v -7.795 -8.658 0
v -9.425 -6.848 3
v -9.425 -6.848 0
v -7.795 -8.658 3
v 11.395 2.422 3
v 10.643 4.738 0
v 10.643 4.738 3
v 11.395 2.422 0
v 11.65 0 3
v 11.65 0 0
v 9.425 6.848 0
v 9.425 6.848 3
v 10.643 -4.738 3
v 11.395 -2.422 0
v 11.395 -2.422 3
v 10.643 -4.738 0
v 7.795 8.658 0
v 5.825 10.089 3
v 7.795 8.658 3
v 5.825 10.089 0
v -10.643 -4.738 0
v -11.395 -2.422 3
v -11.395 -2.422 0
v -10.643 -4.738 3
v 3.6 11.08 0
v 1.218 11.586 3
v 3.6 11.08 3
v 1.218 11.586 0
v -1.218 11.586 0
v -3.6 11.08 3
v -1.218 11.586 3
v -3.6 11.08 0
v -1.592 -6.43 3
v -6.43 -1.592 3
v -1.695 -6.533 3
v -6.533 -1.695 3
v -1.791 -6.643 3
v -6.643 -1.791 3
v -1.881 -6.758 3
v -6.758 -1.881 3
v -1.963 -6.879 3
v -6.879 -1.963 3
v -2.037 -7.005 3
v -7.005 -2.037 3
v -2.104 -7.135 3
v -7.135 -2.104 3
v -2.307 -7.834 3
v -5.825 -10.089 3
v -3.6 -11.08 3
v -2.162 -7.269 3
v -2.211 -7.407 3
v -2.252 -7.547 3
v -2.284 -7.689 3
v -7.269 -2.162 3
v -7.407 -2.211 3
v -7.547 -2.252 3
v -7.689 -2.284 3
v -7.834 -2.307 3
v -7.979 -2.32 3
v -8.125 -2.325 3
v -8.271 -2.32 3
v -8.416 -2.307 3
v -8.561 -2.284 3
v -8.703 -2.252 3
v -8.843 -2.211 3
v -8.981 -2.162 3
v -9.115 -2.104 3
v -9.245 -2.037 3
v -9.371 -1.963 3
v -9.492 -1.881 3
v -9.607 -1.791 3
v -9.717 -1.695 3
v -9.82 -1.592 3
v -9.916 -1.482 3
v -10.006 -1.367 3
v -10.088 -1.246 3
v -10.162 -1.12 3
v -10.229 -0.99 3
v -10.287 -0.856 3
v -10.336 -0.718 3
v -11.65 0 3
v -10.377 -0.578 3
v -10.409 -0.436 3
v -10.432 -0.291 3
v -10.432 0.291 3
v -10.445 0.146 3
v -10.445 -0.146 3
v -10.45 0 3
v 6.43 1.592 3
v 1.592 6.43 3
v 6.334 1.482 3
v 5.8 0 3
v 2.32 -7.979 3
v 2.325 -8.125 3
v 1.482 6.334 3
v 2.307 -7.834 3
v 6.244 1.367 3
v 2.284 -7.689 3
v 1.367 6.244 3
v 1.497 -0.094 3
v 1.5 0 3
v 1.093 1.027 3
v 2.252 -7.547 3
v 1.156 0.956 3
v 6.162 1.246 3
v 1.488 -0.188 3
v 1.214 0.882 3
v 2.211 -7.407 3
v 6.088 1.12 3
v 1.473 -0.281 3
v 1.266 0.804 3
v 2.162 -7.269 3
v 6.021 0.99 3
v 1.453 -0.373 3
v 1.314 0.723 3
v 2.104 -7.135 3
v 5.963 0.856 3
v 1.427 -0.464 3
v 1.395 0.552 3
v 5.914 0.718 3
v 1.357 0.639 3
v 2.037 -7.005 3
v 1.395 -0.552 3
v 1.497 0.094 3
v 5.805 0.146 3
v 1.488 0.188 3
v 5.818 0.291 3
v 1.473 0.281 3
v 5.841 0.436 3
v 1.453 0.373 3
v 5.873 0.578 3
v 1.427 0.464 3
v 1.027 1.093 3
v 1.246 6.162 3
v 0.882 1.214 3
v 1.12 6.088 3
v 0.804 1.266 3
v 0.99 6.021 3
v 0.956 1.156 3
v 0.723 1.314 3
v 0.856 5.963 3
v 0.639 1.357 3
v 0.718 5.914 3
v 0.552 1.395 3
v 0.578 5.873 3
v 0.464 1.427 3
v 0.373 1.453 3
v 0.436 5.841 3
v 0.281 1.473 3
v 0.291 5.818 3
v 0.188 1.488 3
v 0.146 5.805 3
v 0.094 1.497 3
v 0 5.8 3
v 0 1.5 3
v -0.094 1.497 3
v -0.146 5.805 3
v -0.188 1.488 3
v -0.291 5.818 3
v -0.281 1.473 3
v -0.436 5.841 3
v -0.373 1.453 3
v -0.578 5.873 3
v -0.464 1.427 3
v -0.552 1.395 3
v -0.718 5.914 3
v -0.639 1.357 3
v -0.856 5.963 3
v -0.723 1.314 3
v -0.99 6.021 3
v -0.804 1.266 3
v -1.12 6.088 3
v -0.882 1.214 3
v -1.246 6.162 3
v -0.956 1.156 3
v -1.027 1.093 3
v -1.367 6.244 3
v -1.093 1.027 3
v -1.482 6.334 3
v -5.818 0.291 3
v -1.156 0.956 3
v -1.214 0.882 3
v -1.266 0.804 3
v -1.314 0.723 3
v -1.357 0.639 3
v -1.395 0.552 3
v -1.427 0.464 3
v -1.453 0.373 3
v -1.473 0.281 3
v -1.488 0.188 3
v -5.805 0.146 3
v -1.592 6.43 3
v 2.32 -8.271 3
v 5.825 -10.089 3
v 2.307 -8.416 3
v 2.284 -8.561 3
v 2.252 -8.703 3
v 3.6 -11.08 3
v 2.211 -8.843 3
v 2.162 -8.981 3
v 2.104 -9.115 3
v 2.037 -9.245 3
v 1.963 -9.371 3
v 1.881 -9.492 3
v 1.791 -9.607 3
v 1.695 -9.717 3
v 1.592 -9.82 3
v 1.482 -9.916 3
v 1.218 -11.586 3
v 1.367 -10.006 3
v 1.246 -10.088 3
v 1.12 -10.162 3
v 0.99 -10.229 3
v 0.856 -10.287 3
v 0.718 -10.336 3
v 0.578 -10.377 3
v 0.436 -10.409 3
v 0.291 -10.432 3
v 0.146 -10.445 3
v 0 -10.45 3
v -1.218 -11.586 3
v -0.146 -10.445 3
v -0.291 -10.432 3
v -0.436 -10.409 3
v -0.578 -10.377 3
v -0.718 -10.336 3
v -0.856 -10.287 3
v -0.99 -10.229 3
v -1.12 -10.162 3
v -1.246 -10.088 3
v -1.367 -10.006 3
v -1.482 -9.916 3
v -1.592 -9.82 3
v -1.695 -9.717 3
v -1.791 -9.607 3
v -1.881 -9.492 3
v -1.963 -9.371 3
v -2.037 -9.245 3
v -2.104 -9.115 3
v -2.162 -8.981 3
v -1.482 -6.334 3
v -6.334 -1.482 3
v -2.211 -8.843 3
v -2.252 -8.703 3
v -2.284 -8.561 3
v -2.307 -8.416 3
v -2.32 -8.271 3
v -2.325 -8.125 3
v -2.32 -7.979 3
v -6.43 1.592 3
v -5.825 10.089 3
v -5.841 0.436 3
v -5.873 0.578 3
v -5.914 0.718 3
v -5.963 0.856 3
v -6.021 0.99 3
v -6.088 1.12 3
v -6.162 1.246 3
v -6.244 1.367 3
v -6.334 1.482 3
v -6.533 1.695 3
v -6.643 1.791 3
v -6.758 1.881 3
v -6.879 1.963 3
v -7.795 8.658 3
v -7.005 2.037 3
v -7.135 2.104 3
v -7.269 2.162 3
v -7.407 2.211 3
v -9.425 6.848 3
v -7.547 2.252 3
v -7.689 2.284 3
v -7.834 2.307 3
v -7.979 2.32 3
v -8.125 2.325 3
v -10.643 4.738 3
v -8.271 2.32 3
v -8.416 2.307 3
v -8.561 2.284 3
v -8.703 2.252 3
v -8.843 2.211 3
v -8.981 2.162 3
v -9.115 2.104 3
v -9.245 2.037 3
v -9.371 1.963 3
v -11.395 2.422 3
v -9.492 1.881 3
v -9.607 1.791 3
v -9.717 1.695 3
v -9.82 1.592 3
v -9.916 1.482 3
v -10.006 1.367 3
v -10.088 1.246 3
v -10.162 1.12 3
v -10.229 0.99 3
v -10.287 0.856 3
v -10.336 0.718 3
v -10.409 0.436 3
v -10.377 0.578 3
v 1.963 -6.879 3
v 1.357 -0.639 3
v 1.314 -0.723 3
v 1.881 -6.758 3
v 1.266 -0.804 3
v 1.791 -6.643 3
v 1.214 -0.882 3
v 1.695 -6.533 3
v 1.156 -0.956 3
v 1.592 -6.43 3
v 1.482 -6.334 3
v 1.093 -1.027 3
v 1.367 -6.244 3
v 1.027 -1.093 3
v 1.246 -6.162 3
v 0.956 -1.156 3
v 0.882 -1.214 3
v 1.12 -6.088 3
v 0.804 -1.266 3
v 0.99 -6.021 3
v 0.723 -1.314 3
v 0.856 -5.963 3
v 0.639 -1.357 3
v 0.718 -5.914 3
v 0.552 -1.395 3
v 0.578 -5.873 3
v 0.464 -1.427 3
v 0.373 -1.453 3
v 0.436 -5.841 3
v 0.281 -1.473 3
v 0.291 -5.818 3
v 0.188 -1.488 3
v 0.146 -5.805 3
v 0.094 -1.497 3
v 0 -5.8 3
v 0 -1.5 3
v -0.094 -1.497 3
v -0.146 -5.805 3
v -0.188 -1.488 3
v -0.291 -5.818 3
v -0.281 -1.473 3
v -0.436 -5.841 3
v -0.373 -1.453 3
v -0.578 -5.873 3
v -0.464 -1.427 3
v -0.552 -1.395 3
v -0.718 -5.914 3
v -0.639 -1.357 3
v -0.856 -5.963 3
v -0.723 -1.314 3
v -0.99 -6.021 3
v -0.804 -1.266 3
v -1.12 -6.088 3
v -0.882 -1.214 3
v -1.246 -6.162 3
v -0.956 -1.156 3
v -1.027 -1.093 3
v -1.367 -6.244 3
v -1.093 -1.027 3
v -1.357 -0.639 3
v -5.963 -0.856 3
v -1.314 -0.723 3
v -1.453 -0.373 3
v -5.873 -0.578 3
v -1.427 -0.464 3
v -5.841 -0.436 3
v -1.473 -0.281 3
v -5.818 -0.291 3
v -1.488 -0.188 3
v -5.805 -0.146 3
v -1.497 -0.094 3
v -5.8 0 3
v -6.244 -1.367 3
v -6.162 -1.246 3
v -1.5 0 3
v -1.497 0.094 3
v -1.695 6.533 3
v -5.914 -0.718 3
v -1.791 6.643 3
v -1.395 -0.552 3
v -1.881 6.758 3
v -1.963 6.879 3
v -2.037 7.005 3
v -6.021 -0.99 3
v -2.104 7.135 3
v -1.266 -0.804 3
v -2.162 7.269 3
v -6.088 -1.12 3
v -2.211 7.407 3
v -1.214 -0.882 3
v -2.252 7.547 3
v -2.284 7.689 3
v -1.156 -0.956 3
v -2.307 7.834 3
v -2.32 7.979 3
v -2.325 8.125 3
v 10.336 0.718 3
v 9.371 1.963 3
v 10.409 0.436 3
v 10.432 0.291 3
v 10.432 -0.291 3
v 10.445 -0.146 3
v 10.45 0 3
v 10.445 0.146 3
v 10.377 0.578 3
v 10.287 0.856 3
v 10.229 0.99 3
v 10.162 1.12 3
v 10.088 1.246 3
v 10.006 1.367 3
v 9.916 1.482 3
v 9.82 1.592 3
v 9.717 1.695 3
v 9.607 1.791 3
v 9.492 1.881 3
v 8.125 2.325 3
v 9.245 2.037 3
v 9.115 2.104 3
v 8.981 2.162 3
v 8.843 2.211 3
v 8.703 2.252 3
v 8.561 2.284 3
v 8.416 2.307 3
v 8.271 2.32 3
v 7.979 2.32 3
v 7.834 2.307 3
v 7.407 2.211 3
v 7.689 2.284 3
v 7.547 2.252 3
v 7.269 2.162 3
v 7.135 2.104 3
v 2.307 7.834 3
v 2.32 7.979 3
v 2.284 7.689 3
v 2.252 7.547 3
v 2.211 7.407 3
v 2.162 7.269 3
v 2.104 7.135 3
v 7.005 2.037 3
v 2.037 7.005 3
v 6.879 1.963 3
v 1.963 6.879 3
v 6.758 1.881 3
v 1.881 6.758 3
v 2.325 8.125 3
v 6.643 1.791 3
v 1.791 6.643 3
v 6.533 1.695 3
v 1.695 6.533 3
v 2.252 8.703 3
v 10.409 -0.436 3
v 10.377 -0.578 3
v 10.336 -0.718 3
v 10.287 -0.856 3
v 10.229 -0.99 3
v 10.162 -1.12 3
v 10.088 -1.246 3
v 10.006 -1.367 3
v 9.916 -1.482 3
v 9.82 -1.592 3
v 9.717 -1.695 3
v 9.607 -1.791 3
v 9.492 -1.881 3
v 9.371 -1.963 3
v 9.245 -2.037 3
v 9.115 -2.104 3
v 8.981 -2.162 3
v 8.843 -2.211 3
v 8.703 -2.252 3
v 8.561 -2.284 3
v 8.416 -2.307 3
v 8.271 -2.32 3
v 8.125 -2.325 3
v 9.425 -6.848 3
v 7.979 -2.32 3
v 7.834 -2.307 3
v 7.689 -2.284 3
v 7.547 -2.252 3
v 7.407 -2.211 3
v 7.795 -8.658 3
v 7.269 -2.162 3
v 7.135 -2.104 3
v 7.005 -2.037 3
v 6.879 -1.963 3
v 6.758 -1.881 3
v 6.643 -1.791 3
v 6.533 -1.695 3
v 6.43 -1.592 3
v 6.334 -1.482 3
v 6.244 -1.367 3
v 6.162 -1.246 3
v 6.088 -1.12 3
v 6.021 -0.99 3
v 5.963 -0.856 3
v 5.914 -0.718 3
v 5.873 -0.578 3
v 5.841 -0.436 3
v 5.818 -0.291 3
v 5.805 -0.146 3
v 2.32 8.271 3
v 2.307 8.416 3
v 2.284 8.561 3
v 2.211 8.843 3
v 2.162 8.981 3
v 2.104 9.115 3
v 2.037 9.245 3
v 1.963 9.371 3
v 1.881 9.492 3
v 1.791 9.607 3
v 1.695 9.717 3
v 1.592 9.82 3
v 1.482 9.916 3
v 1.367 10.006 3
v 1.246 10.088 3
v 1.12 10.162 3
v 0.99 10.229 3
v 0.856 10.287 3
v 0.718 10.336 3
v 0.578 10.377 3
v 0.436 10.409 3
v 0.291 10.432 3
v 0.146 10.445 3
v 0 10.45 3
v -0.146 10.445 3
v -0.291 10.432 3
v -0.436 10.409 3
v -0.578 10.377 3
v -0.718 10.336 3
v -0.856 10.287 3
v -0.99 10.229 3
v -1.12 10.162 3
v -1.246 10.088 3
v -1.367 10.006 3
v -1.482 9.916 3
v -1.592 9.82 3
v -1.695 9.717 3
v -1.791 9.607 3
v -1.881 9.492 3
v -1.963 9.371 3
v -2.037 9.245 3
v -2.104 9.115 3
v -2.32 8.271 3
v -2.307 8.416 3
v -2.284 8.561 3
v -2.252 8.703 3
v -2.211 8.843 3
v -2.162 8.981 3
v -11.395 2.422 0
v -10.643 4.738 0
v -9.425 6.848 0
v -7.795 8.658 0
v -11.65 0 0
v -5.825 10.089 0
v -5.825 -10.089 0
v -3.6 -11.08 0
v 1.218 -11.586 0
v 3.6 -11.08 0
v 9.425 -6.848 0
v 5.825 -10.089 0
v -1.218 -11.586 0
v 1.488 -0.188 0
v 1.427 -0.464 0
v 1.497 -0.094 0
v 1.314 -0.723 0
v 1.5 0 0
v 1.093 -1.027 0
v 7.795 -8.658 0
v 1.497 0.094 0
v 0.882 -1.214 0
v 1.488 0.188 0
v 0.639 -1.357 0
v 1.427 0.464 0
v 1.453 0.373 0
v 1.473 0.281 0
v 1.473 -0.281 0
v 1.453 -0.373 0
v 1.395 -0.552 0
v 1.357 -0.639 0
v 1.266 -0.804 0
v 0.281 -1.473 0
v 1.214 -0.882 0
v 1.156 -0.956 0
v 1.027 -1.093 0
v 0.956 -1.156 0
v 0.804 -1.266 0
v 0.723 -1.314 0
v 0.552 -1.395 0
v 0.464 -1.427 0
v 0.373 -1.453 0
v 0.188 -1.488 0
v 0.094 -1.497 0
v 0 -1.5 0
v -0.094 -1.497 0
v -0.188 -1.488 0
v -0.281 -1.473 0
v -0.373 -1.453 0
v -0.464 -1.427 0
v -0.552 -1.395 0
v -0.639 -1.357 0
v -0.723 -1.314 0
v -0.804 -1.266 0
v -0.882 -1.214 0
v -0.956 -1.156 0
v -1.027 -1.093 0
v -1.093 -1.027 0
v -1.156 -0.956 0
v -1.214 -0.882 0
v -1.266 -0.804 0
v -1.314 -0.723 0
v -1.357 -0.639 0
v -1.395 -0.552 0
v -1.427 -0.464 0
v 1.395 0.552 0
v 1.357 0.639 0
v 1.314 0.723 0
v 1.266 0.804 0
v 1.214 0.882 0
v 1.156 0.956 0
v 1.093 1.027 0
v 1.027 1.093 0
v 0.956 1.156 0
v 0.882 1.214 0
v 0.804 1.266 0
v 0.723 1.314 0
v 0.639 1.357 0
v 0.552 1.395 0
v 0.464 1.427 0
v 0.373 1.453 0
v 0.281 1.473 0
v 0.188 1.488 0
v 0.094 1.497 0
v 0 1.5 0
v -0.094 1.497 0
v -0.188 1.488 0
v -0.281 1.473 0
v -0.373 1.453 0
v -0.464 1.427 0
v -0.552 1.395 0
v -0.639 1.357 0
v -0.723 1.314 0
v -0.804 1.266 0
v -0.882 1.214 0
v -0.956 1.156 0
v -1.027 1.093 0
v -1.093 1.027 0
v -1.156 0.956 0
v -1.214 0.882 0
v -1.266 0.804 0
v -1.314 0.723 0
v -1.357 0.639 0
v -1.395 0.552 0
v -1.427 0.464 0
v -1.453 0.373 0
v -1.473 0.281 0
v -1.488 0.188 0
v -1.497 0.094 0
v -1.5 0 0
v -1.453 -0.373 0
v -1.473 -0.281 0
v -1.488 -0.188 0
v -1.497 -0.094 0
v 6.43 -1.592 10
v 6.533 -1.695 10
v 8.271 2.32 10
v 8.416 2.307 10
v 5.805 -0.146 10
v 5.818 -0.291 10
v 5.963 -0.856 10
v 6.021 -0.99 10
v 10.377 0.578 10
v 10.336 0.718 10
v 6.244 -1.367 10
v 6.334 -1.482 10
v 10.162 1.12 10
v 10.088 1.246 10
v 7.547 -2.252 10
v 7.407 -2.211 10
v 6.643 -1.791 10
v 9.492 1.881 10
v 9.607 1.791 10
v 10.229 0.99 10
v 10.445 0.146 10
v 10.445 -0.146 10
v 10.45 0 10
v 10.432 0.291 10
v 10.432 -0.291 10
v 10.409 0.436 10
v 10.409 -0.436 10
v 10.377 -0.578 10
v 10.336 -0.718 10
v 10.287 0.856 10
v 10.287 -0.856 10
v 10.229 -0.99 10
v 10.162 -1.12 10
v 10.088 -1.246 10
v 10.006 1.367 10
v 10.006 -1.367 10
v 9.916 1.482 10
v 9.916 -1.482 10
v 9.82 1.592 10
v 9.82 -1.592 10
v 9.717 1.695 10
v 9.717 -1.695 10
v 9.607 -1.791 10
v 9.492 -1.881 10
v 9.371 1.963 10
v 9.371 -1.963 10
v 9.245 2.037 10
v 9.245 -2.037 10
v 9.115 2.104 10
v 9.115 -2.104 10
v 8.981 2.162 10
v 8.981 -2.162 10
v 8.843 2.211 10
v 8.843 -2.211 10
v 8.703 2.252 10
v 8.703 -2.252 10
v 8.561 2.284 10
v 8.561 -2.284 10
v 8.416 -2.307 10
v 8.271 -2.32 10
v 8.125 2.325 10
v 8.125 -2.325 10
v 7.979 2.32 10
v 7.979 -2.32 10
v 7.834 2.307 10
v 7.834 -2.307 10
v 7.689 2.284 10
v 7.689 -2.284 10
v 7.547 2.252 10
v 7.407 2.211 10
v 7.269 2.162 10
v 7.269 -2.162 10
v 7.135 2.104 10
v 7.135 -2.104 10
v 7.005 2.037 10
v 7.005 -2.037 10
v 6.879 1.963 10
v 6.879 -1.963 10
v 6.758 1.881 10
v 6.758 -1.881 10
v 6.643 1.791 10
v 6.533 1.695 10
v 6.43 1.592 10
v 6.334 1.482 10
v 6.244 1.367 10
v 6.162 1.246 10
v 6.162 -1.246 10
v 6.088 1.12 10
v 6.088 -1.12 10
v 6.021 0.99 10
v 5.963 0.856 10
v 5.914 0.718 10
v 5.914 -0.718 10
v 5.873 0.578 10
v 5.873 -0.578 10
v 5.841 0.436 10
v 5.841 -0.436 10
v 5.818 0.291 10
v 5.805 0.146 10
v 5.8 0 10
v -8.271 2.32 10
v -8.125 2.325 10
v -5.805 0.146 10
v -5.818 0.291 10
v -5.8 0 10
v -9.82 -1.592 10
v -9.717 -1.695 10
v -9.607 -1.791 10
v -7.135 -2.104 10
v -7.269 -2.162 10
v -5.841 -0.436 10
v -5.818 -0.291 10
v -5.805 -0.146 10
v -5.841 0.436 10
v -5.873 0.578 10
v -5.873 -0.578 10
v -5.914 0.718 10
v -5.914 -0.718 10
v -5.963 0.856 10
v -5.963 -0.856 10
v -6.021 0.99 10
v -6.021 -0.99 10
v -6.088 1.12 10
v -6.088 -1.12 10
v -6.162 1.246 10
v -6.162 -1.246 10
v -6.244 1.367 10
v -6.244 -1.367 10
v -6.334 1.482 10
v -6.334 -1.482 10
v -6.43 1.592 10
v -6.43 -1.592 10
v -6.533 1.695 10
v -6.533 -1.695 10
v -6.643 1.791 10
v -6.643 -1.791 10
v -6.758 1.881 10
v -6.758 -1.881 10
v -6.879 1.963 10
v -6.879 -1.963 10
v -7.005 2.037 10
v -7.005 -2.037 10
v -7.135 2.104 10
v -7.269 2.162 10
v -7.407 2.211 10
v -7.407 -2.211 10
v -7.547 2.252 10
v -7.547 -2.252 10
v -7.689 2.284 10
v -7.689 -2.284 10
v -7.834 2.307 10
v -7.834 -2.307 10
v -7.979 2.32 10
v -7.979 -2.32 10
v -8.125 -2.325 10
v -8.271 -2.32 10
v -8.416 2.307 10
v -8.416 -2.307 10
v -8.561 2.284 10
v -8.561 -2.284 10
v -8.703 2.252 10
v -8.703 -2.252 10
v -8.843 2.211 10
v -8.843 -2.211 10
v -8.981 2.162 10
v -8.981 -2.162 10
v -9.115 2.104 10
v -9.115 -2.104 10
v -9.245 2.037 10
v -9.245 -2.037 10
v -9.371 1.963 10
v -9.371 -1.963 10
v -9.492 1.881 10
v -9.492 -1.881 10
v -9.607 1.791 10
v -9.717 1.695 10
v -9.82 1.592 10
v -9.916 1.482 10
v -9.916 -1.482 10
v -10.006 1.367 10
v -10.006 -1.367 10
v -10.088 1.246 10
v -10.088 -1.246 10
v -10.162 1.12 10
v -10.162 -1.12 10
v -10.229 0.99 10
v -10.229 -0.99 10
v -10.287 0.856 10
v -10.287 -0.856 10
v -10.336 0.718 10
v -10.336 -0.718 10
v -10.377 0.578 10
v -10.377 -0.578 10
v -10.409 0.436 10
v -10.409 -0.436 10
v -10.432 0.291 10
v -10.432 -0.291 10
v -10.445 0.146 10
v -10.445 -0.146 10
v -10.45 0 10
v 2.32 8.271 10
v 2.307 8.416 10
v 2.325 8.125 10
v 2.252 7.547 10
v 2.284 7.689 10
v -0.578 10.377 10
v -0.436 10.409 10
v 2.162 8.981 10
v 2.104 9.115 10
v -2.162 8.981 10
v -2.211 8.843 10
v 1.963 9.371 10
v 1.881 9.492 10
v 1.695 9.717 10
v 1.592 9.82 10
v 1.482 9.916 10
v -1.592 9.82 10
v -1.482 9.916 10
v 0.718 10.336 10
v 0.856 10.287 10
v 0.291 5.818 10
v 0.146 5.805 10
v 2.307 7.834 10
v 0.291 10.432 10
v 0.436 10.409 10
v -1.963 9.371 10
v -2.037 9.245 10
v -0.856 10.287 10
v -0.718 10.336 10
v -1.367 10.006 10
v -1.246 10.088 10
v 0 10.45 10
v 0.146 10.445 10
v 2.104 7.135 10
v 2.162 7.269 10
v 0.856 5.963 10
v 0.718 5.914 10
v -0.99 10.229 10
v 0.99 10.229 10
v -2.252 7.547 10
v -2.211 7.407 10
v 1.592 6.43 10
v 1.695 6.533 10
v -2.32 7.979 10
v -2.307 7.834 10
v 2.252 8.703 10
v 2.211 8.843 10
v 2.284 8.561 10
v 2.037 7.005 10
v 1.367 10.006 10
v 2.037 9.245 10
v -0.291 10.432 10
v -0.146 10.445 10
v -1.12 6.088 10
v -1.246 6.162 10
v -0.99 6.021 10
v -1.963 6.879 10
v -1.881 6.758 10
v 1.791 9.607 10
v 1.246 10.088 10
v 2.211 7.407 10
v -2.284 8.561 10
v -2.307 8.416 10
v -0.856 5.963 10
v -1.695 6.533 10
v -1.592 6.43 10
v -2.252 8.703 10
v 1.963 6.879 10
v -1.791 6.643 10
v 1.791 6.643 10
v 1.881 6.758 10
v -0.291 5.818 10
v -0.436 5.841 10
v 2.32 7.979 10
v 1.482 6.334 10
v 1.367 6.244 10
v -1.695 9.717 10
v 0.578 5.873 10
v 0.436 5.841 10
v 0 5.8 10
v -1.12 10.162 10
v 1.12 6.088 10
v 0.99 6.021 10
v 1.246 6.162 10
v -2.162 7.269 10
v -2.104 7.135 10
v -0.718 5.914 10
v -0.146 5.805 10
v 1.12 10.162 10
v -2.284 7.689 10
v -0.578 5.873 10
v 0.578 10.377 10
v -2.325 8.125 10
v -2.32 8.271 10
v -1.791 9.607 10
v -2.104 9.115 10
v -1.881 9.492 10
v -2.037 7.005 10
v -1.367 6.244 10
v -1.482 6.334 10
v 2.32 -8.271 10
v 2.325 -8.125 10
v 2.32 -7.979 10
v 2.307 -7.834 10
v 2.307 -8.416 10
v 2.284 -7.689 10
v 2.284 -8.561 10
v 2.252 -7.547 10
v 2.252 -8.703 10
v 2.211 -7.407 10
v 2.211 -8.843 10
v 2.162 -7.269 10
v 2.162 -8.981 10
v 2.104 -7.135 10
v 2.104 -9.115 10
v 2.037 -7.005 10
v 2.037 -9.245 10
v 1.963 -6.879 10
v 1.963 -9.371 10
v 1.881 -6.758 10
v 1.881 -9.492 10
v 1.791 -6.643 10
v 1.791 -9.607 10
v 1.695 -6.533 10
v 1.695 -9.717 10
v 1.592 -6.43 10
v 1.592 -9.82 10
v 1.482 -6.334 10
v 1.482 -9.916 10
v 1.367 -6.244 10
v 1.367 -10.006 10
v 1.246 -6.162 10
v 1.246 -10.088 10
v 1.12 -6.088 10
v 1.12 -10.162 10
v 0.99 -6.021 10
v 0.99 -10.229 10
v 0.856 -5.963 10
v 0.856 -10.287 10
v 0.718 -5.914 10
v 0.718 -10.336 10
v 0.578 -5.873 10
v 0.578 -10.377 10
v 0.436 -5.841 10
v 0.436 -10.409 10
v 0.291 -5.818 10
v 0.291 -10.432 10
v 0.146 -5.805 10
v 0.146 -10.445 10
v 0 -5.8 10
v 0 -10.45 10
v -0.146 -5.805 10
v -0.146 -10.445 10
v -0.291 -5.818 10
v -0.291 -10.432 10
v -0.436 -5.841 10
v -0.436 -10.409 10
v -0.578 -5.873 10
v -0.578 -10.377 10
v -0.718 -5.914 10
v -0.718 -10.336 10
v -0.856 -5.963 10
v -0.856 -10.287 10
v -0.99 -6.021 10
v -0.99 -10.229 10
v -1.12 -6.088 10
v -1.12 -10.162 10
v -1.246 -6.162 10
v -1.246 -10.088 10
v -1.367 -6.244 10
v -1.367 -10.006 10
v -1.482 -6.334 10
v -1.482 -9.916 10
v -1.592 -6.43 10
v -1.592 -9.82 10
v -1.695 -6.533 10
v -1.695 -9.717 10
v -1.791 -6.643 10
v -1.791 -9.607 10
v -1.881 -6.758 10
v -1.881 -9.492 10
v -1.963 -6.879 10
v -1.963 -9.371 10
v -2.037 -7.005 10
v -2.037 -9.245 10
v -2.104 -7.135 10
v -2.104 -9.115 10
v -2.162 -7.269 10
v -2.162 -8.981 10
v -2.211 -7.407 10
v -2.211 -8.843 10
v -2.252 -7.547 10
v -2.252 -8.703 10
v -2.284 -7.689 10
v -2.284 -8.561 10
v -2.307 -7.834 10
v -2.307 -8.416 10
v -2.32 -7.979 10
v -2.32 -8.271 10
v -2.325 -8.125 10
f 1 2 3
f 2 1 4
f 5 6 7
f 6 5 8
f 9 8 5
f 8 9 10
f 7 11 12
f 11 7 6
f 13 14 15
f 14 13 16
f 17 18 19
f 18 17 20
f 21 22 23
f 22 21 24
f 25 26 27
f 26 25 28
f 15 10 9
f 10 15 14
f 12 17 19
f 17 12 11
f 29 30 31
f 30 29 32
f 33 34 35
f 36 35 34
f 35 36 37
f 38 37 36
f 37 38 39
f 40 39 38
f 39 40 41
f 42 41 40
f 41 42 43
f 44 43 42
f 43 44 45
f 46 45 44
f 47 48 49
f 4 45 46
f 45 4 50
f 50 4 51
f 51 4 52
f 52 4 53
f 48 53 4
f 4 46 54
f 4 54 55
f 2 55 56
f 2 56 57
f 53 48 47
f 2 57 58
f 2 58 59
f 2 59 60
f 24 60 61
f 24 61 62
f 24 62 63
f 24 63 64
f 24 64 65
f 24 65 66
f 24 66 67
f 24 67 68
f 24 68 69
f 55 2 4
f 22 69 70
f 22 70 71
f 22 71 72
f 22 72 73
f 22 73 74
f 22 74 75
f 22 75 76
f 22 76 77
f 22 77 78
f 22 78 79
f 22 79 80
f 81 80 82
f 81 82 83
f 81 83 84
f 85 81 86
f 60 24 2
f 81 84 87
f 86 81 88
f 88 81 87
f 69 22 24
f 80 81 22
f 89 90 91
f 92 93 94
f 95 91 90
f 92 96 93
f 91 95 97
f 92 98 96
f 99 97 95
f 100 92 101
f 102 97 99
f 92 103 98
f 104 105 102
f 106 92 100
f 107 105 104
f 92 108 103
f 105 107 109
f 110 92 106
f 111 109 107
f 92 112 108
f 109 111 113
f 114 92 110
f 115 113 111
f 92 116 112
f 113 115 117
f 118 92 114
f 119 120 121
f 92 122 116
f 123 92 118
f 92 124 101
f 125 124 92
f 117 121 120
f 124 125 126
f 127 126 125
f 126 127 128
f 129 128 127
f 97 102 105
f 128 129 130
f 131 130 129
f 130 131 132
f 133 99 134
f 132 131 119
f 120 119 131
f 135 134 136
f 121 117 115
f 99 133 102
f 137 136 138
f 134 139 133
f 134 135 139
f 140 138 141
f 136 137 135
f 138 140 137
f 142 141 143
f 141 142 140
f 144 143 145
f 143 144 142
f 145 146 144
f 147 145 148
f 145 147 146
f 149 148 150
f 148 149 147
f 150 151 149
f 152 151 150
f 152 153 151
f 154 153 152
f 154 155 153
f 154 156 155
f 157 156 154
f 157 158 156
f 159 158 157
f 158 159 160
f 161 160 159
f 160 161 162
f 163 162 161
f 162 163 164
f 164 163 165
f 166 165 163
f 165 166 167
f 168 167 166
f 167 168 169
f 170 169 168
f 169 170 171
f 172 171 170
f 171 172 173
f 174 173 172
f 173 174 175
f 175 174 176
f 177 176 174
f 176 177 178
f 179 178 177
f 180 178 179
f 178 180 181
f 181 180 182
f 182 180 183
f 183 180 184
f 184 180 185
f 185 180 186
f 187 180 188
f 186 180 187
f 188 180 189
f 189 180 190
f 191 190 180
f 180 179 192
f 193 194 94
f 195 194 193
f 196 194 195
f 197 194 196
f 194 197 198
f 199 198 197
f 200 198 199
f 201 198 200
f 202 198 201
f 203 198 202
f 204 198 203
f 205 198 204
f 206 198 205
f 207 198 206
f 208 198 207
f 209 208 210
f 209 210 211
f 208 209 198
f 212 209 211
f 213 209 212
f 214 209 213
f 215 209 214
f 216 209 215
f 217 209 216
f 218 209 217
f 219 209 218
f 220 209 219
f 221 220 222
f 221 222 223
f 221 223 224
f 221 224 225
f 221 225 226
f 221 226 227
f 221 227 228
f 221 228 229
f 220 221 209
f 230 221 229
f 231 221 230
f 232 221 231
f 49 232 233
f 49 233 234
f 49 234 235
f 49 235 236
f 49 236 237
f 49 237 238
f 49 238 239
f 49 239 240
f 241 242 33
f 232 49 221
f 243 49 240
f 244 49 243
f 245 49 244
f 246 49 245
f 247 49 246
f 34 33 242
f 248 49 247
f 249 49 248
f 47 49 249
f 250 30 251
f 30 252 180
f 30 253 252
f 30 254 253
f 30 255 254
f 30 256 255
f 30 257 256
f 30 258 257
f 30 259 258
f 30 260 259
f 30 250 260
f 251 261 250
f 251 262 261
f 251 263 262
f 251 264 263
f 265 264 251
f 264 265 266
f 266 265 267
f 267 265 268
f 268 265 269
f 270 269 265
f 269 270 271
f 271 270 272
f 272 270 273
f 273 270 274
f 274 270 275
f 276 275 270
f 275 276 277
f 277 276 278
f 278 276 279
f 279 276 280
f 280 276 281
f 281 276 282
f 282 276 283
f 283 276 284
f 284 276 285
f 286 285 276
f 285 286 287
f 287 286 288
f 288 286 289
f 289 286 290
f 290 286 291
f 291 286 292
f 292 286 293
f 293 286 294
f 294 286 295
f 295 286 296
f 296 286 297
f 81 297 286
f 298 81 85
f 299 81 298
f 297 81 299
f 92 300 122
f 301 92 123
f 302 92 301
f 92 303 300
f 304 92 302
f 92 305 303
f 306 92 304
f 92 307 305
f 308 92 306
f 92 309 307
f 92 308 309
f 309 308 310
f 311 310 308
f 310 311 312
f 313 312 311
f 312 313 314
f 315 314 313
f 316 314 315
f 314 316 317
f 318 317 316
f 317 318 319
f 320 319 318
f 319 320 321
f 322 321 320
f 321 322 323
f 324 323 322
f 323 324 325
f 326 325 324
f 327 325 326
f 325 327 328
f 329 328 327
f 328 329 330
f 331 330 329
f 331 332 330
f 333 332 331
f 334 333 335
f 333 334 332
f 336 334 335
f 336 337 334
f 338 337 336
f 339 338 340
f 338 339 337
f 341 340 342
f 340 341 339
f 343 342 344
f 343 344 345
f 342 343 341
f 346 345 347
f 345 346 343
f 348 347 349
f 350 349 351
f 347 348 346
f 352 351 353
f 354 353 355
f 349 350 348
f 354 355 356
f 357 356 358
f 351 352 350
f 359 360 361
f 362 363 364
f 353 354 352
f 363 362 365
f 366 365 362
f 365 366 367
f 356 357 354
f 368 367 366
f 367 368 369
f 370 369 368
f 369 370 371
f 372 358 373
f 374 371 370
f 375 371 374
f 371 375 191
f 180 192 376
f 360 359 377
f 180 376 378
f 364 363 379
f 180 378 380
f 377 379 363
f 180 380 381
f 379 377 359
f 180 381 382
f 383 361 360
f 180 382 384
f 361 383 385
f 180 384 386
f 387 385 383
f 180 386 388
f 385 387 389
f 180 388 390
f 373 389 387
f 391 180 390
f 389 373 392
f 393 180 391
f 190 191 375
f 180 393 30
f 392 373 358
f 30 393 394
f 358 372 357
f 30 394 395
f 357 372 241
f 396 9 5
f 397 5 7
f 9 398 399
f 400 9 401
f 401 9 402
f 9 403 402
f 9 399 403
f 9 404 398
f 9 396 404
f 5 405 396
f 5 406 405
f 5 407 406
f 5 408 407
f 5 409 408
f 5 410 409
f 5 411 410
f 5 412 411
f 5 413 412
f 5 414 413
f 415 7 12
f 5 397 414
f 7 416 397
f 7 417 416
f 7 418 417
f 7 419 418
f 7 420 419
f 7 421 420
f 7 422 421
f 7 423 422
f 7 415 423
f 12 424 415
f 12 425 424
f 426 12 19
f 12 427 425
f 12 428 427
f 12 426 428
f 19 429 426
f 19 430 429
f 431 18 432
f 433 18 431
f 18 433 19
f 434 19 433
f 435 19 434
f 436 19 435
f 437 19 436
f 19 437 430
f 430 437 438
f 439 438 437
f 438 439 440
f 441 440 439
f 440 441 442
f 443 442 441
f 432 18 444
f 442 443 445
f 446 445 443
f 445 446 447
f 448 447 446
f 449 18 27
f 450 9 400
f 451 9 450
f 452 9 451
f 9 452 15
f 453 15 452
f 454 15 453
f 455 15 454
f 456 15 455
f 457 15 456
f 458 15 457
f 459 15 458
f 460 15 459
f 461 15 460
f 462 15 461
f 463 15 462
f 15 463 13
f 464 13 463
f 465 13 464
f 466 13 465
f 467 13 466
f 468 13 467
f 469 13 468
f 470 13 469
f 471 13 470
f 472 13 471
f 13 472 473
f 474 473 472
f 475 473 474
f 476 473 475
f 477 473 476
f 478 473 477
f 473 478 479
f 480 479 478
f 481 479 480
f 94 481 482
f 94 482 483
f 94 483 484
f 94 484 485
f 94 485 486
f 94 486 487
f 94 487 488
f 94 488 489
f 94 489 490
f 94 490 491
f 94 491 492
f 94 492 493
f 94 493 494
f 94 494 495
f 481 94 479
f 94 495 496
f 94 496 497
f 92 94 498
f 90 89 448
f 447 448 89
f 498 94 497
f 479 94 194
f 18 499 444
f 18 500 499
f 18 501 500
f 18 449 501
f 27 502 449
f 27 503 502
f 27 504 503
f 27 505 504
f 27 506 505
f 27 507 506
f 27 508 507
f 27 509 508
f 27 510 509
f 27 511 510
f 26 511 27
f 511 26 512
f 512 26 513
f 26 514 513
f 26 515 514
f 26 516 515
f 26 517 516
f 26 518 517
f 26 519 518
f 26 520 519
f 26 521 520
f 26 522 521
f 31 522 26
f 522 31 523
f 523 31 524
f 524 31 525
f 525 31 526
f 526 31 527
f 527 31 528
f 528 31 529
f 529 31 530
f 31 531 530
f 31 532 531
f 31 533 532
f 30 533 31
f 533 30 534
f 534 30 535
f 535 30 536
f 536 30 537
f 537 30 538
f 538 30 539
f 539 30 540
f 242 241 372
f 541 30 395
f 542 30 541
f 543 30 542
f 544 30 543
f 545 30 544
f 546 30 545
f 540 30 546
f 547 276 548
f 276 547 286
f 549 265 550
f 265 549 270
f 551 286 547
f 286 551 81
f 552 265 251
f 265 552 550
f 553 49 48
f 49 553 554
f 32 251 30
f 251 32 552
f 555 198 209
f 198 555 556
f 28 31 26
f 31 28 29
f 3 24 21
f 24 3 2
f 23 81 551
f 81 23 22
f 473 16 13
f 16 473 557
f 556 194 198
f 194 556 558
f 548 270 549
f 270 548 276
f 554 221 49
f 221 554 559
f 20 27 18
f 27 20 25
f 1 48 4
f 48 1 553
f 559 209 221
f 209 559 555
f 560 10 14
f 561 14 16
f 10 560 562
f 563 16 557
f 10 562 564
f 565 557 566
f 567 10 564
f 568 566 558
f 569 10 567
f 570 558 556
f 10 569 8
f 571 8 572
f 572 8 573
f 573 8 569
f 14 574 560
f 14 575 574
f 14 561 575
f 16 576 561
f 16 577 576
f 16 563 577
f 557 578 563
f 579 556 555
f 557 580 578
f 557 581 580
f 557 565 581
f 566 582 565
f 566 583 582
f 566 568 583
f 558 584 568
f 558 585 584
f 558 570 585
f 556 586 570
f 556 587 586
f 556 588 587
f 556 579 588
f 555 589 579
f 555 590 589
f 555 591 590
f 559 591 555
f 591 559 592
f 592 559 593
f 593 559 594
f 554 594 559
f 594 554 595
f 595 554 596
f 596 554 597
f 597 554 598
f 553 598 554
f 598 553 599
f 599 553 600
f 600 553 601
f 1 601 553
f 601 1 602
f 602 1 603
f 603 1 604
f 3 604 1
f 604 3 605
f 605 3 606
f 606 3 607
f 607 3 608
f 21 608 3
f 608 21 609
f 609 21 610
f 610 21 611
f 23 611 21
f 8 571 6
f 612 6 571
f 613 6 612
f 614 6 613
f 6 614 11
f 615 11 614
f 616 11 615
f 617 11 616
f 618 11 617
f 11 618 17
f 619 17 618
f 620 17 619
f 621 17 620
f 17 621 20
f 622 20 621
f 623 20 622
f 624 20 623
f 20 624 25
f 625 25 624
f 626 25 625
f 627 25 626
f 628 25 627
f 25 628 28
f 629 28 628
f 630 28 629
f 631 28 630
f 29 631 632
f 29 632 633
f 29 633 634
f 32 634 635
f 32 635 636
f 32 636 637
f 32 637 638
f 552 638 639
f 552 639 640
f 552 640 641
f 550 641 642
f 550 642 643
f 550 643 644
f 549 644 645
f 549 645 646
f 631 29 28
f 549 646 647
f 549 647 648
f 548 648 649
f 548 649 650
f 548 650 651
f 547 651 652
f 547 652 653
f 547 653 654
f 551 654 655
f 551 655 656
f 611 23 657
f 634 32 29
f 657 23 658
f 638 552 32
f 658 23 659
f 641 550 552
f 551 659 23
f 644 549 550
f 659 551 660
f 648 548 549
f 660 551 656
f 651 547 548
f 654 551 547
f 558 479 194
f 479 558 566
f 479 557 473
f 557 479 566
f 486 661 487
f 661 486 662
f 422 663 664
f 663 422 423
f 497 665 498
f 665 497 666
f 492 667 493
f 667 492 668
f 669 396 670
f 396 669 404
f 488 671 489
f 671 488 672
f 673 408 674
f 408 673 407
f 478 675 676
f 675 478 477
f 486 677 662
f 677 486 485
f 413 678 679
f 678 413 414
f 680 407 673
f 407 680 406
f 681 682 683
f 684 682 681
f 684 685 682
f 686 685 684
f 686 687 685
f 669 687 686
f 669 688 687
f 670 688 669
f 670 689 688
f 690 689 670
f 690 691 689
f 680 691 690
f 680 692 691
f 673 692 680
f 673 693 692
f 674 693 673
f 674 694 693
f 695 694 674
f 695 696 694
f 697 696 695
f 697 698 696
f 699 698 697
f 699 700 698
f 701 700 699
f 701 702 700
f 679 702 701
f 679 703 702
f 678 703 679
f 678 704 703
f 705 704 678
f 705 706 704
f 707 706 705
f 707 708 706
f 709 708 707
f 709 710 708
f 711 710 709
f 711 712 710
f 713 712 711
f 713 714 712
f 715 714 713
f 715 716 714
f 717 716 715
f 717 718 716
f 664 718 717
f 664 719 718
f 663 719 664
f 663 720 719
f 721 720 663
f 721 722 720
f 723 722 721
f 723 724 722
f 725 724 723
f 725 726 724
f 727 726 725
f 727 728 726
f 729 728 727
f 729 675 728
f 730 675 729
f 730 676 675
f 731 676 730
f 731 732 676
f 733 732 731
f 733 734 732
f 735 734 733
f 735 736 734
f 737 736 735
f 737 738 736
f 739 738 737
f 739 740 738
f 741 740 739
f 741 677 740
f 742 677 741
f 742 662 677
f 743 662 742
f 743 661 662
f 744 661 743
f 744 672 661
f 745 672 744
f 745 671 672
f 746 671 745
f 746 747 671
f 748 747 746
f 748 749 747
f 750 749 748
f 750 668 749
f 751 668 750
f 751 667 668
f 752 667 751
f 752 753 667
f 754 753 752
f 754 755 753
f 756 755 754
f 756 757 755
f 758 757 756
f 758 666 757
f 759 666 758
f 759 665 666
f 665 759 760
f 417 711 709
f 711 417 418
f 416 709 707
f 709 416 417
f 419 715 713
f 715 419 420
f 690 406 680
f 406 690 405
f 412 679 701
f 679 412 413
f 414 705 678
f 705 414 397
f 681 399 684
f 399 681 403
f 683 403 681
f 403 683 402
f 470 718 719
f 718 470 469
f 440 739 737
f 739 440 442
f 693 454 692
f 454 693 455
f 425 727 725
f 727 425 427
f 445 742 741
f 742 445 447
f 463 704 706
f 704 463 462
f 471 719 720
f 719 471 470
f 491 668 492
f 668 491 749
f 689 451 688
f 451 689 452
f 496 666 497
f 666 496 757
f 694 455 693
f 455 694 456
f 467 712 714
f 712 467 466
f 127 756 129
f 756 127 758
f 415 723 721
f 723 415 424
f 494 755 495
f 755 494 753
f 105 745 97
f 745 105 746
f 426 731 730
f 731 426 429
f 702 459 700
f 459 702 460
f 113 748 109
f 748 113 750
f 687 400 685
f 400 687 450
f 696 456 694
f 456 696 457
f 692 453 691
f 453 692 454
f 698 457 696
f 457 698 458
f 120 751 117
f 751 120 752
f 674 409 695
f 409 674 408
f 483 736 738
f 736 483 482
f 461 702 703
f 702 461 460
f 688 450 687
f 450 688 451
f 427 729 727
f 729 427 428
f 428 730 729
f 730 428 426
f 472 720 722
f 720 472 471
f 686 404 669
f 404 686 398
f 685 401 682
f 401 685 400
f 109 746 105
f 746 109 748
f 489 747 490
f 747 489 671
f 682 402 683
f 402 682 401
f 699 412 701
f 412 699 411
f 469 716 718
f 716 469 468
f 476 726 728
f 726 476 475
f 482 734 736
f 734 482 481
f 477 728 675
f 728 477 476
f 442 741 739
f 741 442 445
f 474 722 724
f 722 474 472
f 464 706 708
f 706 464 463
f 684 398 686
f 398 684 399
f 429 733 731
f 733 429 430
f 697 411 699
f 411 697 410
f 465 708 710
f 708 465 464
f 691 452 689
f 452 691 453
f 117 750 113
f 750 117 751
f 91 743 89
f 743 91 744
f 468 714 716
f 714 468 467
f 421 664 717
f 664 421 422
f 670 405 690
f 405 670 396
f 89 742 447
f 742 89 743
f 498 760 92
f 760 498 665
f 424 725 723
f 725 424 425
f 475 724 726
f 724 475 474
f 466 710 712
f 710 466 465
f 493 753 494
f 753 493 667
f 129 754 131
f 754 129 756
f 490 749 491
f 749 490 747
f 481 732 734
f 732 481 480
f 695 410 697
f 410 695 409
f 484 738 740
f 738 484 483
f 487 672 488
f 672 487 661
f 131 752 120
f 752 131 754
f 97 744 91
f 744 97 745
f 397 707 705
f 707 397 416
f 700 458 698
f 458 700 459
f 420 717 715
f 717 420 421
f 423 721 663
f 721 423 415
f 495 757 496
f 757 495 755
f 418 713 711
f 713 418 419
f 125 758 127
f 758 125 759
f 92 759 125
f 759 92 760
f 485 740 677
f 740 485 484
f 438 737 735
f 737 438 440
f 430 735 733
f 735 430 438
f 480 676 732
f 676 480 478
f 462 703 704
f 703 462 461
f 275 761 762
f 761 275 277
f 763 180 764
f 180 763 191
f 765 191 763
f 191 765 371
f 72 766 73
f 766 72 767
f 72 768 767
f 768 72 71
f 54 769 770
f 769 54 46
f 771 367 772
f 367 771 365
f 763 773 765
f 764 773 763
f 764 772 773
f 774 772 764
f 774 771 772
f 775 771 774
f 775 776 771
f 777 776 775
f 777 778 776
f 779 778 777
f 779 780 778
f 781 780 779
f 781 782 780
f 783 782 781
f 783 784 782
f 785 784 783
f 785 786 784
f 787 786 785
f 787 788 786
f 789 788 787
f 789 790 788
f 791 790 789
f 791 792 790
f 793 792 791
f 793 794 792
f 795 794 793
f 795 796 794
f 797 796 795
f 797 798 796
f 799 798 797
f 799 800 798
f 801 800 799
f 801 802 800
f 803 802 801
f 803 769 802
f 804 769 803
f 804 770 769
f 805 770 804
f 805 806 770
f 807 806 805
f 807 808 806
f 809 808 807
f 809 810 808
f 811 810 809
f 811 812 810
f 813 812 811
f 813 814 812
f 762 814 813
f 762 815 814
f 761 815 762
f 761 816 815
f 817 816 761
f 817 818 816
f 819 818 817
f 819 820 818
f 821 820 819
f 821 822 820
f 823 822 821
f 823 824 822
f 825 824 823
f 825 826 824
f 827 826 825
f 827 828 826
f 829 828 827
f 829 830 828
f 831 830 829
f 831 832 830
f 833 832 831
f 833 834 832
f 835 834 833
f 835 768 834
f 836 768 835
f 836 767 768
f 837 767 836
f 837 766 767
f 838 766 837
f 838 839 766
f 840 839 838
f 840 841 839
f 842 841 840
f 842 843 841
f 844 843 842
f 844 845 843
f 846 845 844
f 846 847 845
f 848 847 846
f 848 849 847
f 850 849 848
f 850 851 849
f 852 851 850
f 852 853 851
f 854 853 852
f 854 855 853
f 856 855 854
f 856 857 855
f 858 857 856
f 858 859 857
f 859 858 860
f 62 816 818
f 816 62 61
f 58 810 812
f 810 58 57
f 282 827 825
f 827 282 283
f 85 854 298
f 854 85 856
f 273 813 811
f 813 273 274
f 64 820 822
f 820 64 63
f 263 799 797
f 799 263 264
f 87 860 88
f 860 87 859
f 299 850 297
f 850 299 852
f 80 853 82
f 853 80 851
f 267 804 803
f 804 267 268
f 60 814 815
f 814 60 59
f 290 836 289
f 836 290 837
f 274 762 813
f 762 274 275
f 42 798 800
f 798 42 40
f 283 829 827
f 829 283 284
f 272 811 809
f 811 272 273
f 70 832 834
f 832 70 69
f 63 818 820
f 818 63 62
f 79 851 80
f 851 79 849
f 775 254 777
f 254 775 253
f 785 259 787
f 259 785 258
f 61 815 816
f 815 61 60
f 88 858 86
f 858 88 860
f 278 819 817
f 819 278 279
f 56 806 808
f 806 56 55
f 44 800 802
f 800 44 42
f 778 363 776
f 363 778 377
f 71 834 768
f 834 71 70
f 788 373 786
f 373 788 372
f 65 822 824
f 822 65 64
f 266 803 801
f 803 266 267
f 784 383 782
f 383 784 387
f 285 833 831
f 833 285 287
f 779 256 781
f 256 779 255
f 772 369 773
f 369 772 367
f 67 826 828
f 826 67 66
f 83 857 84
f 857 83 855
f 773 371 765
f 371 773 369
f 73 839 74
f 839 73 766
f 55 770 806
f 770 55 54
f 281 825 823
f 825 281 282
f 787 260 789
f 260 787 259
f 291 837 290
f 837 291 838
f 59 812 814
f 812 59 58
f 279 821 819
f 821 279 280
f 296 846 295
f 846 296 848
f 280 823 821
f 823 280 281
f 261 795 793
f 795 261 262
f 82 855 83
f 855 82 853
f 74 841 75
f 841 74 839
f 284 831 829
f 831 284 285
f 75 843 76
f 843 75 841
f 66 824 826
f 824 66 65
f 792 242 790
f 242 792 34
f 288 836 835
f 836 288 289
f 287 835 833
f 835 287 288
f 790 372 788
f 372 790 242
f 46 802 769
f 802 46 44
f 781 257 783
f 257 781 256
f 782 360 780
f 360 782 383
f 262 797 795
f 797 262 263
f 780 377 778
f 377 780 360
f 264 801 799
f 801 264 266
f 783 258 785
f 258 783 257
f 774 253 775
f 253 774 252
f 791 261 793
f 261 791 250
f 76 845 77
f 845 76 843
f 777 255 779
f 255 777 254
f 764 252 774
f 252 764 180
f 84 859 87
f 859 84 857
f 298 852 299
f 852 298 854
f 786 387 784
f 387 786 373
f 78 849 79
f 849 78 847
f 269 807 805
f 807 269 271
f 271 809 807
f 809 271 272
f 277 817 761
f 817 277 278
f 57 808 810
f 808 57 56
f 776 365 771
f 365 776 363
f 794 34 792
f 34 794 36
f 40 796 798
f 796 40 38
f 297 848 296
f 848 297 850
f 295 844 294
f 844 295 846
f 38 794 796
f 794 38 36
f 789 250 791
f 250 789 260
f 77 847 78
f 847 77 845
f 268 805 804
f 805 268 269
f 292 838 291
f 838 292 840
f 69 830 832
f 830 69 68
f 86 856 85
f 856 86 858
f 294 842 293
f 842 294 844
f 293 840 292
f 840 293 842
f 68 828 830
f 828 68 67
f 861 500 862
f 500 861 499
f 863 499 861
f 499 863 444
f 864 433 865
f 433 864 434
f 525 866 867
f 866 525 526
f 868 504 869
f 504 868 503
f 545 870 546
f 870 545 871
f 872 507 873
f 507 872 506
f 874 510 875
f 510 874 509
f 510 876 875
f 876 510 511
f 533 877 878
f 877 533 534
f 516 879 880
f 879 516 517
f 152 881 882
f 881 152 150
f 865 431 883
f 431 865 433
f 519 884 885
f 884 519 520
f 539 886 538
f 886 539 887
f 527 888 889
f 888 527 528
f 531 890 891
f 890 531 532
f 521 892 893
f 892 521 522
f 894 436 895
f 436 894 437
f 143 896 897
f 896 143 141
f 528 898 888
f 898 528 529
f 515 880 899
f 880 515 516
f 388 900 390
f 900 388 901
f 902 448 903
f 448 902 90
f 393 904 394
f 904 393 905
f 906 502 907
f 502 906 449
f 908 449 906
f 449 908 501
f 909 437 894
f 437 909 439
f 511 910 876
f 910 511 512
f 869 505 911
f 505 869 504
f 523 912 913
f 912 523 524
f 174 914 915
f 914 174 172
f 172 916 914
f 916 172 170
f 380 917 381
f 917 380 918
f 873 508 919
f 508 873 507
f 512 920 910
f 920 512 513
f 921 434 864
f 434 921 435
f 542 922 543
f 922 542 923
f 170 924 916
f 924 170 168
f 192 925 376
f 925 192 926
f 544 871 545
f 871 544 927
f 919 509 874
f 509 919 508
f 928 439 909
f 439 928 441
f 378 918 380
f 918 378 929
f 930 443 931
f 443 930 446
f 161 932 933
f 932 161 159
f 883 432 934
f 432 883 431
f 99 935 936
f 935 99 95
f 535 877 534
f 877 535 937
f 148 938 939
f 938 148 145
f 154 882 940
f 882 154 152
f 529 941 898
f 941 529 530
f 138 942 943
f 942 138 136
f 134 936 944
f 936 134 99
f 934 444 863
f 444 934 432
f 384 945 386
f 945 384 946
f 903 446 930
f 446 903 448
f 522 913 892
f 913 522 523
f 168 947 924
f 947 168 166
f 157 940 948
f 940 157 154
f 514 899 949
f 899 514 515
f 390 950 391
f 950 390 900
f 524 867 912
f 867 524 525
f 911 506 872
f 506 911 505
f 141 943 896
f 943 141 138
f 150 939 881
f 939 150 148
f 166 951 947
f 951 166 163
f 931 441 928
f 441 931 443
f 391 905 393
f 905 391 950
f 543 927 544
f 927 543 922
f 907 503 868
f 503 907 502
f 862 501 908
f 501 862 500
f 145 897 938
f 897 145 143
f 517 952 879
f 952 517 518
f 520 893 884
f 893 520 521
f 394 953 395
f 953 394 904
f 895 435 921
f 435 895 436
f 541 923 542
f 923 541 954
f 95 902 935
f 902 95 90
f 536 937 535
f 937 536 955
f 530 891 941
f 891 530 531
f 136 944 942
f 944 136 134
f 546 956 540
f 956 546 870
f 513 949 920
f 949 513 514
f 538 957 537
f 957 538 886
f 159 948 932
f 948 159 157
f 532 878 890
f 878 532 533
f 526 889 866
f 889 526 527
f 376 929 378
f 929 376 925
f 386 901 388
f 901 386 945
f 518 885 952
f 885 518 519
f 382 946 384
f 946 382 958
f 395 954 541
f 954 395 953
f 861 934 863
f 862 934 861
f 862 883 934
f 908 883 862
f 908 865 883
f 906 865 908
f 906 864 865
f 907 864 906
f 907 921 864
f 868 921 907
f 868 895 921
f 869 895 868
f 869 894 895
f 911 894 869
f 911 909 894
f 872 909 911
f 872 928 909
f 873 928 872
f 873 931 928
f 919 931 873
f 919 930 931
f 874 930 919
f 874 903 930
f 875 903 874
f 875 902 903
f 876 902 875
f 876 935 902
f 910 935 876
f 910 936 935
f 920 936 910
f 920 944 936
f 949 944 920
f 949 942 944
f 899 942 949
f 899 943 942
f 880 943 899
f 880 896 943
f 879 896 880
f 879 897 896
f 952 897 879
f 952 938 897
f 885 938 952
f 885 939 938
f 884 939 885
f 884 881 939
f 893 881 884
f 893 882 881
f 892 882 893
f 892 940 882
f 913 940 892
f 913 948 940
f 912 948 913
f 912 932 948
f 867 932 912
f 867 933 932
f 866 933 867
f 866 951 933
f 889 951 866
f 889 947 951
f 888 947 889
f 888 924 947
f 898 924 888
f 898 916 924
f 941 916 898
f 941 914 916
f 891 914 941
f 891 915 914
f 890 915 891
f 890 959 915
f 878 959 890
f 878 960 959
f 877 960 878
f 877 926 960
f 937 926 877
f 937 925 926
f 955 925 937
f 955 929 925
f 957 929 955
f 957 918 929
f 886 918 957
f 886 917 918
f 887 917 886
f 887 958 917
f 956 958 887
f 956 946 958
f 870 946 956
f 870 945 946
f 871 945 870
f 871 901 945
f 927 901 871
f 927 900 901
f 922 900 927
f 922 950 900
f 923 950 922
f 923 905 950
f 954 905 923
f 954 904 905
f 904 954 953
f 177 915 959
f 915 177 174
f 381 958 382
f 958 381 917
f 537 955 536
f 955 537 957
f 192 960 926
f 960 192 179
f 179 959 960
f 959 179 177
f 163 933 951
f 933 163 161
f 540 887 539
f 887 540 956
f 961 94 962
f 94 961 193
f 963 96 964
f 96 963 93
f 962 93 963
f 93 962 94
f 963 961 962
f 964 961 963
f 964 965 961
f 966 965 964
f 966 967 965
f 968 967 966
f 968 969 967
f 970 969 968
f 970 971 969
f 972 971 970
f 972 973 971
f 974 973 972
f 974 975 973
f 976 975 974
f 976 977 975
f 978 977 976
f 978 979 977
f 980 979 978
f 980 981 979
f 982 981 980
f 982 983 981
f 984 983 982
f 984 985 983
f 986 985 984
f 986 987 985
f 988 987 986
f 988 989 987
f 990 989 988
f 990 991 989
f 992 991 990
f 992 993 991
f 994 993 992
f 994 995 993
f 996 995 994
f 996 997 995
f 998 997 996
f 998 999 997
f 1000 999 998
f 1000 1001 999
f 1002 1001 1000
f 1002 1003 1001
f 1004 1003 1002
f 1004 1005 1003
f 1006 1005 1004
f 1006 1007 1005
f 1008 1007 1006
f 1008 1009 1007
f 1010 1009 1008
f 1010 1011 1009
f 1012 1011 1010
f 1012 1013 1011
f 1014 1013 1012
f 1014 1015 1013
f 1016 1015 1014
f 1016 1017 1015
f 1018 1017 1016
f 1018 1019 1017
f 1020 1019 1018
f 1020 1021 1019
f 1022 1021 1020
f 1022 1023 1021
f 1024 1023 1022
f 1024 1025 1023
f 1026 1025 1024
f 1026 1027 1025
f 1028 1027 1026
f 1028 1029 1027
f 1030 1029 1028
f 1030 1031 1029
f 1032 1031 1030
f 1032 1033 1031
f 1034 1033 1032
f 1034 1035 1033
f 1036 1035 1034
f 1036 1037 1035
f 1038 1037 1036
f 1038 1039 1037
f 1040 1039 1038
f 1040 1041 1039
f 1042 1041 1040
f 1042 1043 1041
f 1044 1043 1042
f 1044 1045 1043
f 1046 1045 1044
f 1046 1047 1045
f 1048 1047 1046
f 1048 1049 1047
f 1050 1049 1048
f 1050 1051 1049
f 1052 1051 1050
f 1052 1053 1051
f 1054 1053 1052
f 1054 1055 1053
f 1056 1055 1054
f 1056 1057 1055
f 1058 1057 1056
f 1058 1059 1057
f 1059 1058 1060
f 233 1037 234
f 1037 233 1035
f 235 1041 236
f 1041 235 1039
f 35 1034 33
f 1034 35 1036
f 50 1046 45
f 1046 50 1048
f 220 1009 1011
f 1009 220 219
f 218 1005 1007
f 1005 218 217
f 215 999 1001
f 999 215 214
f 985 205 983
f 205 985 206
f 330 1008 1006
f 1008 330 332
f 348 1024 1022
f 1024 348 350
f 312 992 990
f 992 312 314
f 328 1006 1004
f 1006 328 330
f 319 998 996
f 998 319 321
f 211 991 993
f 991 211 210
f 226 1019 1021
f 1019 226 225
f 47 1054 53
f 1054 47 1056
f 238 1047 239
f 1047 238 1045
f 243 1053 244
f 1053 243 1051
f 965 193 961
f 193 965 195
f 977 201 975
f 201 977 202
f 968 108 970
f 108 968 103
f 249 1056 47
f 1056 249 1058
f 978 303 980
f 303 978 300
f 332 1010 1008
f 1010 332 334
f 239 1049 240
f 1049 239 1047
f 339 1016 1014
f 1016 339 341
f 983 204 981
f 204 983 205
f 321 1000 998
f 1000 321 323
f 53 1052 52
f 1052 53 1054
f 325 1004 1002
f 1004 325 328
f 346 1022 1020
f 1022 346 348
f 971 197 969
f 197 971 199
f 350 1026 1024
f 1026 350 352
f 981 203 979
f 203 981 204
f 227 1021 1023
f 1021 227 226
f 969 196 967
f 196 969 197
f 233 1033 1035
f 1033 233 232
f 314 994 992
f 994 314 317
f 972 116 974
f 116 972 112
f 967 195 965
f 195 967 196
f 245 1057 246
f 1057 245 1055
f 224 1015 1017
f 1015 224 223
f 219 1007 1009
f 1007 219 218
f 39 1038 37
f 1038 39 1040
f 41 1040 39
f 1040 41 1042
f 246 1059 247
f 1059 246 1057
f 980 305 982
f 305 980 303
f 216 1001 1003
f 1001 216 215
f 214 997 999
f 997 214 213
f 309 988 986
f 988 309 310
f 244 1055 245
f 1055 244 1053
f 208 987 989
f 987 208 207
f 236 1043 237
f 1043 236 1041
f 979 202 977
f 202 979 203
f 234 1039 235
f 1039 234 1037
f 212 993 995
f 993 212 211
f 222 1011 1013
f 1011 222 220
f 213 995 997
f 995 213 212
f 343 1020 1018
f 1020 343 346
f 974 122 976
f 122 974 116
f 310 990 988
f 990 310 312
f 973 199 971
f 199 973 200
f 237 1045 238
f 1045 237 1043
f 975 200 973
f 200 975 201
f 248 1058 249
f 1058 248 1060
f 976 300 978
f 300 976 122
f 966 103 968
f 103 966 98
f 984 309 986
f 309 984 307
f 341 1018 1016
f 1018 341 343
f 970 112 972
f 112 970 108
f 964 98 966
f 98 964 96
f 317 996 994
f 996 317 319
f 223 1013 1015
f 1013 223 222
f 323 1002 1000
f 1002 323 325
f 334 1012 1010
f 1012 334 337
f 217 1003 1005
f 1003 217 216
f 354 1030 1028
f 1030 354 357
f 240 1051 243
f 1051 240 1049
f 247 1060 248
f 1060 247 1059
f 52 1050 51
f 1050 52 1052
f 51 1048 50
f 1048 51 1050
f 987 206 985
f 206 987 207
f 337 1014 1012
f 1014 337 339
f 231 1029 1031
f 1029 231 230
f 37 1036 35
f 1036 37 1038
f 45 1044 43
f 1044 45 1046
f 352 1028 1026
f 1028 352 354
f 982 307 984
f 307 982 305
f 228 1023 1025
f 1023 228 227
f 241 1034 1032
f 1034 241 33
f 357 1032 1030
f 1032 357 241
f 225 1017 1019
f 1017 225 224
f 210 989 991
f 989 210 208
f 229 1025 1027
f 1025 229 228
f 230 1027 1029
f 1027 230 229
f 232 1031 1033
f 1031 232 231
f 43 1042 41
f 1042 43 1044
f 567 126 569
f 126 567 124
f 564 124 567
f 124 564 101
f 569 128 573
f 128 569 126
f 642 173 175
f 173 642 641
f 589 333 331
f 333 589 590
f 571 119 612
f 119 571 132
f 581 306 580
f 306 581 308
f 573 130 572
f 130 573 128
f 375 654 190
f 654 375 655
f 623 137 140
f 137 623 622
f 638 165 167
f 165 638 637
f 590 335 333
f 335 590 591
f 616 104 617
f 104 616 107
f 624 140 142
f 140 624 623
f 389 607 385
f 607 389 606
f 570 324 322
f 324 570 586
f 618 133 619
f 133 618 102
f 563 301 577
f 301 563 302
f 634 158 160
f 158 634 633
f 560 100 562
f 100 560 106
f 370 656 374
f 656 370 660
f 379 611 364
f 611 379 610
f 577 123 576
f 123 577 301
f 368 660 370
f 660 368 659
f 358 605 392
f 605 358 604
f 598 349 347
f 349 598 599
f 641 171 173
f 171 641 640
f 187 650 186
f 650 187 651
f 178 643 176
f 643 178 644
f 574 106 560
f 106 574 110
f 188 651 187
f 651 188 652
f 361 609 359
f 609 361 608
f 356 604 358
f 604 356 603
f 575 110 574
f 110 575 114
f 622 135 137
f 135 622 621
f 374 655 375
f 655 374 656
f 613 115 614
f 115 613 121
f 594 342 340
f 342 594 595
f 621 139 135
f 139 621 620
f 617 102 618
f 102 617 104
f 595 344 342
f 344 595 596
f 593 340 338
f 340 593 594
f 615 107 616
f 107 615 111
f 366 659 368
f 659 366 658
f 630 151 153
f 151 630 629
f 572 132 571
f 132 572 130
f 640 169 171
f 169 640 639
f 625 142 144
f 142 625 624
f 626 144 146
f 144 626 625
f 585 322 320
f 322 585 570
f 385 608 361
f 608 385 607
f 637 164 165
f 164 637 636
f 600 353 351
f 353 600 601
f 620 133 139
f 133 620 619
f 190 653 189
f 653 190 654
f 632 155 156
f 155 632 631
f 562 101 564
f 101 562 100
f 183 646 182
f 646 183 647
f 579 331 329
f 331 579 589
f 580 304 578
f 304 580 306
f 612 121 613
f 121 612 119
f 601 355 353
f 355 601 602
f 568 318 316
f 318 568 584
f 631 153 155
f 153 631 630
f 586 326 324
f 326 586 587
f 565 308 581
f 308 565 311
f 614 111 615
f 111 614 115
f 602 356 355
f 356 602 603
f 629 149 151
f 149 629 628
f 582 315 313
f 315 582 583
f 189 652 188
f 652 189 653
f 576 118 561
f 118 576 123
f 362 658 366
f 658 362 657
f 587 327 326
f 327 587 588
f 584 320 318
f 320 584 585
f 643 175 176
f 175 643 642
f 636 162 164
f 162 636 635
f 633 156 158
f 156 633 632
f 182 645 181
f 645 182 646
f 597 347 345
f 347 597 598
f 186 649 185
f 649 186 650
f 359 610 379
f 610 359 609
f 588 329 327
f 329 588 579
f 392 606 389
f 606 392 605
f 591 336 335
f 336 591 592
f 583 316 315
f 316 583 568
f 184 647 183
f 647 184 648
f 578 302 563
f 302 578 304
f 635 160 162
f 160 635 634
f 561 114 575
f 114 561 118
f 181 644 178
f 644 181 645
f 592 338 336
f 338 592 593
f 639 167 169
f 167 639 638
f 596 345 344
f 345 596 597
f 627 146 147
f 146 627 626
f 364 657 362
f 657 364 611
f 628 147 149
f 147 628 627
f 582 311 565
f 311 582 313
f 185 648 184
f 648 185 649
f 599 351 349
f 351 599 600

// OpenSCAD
h_cylinder = 3;
h_peripherical_legs = 10;
radius_peripherical_legs = 2.325;
radius_central_hole = 1.5;
radius_cylinder = 11.65;
marginal_distance = 1.2;
per_leg_trans = radius_cylinder-radius_peripherical_legs-marginal_distance;

module motor_cap() {
	difference() {
		union() {
		// Main cylinder
		cylinder(h = h_cylinder, r = radius_cylinder, center = false);	

		// Peripherical legs
		translate([per_leg_trans, 0, 0]) color("black") cylinder(h = h_peripherical_legs, r = radius_peripherical_legs, center = false, $fn = 100);
		translate([-per_leg_trans, 0, 0]) color("black") cylinder(h = h_peripherical_legs, r = radius_peripherical_legs, center = false, $fn = 100);
		translate([0, per_leg_trans, 0]) color("black") cylinder(h = h_peripherical_legs, r = radius_peripherical_legs, center = false, $fn = 100);
		translate([0, -per_leg_trans, 0]) color("black") cylinder(h = h_peripherical_legs, r = radius_peripherical_legs, center = false, $fn = 100);
		}
		// Central hole
		cylinder(h = h_cylinder, r = radius_central_hole, center = false, $fn = 100);
	}
}

 motor_cap();
